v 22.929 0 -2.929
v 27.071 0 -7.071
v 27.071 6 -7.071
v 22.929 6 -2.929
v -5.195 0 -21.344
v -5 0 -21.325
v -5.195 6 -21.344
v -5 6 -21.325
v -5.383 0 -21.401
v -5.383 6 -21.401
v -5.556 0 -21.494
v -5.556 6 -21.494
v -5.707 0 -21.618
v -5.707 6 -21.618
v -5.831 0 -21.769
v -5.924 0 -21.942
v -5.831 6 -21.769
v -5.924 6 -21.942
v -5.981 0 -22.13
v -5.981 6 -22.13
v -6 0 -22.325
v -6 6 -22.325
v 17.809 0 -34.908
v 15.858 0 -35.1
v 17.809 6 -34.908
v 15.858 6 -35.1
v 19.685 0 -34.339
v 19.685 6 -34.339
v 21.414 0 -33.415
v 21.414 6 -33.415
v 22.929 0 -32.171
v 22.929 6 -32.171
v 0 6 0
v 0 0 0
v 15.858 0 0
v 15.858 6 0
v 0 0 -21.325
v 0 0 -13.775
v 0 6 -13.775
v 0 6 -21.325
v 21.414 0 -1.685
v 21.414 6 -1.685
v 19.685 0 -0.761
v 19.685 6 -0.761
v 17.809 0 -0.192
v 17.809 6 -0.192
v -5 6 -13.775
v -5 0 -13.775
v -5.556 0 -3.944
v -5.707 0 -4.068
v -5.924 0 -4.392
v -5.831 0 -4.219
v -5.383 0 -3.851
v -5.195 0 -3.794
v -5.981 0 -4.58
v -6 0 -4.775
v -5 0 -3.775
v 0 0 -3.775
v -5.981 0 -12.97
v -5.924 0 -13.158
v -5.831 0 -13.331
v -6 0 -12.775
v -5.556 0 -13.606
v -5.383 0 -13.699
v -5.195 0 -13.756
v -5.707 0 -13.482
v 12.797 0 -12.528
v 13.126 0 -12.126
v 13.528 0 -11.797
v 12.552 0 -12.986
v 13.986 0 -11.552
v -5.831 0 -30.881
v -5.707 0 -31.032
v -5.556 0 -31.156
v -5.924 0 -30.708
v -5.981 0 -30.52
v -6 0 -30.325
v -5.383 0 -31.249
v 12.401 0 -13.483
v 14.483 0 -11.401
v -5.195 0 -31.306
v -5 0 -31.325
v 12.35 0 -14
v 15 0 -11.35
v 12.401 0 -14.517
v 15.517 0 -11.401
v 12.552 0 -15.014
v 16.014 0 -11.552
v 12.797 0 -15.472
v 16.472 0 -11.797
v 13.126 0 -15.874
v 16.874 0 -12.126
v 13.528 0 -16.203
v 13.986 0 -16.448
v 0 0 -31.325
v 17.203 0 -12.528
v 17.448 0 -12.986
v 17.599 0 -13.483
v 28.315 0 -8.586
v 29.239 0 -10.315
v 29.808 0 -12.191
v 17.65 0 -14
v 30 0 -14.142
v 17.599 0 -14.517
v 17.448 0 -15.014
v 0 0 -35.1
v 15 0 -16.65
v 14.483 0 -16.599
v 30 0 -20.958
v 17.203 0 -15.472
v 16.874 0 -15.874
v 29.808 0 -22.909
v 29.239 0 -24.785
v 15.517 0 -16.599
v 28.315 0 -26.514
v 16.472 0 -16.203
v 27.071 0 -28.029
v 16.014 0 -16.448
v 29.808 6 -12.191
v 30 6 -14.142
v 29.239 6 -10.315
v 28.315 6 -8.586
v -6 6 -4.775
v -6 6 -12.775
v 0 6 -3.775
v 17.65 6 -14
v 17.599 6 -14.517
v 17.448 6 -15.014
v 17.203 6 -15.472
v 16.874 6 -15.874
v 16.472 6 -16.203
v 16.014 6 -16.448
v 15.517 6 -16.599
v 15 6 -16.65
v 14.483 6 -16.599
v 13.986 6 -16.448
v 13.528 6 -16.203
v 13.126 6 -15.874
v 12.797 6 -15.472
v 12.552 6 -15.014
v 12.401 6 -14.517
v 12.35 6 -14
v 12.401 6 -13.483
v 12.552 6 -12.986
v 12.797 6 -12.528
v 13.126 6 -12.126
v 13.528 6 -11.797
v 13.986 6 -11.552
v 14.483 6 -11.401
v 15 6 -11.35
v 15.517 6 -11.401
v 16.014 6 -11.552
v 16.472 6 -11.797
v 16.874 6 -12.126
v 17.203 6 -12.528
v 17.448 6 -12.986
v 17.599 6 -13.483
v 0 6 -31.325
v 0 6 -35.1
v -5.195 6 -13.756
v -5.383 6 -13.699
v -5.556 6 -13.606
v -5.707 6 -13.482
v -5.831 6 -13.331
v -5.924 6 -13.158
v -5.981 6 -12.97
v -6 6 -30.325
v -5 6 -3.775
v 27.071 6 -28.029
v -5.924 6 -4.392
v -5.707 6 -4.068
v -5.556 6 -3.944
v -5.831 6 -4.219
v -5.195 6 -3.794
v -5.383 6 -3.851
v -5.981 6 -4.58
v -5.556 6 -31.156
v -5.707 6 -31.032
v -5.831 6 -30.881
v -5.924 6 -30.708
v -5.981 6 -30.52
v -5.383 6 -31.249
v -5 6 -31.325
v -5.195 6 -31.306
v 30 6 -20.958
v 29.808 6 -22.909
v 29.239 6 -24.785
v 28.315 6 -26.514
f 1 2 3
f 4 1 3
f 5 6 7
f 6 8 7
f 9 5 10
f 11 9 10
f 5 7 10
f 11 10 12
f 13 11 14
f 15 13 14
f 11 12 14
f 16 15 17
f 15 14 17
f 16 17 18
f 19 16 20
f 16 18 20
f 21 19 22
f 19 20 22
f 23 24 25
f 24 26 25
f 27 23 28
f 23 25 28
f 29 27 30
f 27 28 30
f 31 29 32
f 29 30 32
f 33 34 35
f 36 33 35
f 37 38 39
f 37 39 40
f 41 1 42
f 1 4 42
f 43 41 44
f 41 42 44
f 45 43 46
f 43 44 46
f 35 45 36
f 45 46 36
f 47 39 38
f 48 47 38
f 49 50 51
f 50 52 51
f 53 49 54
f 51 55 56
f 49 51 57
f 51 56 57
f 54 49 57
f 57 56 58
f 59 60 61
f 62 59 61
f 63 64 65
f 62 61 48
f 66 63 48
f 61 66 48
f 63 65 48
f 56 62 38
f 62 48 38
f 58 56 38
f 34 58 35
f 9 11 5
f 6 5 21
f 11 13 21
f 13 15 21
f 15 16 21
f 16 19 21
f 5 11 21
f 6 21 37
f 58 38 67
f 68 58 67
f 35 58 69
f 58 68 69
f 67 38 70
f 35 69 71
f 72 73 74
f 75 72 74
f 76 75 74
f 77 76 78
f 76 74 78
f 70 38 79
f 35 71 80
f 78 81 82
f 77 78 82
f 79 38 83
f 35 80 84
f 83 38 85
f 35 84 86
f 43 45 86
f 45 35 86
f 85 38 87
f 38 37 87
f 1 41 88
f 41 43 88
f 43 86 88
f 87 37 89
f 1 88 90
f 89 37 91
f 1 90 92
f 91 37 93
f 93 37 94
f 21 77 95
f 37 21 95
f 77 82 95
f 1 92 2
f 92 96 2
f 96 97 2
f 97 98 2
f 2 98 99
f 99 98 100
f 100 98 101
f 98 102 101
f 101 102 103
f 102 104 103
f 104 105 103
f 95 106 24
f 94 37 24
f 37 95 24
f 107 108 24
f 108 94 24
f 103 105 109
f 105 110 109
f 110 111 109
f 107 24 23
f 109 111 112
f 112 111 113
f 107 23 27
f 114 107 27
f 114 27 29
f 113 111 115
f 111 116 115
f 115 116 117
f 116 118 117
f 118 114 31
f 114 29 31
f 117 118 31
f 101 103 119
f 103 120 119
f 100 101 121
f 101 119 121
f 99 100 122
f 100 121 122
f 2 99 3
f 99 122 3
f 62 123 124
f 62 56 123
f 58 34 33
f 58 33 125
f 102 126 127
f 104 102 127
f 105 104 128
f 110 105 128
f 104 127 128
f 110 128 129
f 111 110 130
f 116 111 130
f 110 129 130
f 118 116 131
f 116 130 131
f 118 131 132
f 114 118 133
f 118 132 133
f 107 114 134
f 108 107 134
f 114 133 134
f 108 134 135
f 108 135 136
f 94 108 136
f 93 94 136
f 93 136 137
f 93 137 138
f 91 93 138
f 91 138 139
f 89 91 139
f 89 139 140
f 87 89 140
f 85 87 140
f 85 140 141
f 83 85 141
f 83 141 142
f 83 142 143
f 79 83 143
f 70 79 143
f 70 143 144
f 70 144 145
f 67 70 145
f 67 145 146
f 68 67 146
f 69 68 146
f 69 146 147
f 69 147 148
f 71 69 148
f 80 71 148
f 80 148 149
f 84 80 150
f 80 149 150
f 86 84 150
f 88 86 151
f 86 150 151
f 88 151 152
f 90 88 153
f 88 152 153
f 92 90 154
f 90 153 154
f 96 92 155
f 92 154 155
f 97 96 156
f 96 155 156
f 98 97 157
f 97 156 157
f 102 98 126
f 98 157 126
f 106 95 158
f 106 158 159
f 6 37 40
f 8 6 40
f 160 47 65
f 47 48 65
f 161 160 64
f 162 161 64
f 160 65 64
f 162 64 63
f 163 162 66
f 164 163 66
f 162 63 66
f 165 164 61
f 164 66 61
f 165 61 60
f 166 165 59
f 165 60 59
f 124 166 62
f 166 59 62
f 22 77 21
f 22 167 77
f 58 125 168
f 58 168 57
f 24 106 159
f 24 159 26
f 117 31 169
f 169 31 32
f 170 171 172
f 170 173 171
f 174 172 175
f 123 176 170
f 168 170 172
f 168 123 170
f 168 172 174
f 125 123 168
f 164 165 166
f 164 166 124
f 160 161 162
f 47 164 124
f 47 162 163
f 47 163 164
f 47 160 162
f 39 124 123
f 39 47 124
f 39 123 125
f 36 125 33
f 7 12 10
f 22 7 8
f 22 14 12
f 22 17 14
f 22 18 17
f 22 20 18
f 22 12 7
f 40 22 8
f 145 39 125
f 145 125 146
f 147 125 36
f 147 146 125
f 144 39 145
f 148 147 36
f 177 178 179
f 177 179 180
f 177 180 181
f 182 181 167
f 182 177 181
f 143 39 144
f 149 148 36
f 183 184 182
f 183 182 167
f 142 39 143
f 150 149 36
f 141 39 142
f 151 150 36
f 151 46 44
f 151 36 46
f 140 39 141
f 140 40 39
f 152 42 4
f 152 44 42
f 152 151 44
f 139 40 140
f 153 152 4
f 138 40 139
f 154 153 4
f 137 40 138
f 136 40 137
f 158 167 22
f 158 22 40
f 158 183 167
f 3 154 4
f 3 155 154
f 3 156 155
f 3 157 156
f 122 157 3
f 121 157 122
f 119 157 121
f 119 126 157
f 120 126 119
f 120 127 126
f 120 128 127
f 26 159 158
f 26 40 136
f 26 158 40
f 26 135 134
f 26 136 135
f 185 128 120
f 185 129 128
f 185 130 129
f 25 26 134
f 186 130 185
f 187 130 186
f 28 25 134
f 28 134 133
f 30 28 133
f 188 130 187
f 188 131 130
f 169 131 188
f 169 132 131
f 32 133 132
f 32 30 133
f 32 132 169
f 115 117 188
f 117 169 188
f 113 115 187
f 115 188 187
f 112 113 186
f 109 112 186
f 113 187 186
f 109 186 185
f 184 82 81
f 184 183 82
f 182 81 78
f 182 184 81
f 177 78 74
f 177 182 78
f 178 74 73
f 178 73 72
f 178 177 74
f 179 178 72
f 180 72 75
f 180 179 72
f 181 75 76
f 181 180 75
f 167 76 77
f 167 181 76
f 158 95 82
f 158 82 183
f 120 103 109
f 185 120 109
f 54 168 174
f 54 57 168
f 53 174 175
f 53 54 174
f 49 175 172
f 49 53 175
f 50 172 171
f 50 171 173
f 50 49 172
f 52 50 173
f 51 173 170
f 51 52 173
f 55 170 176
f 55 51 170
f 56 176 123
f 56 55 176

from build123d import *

# Parameters (mm, degrees)
SKETCH1_W              = 30
SKETCH1_H              = 35.1
BOSS_EXTRUDE1_DEPTH    = 6
CHAMFER1_SIZE          = 10
M5_CLEARANCE_HOLE1_D   = 5.3
SKETCH234_W            = 10
SKETCH234_H            = 6
BOSS_EXTRUDE234_DEPTH  = 6
FILLET134_R            = 1
SKETCH2341_W           = 10
SKETCH2341_H           = 6
BOSS_EXTRUDE2341_DEPTH = 6
FILLET1341_R           = 1
FILLET1342_R           = 10


with BuildPart() as part:
    # Sketch1 → Boss-Extrude1 (new body)
    with BuildSketch(Plane(origin=(0, 0, 0), x_dir=(1, 0, 0), z_dir=(0, 1, 0))):
        with Locations((15, 17.55)):
            Rectangle(SKETCH1_W, SKETCH1_H)
    extrude(amount=BOSS_EXTRUDE1_DEPTH)

    # Chamfer1
    chamfer1_edges = [part.edges().sort_by_distance(p)[0] for p in [
        (30, 3, -35.1),
        (30, 3, 0),
    ]]
    chamfer(chamfer1_edges, length=CHAMFER1_SIZE)

    # M5 Clearance Hole1 (through all)
    with Locations(Plane(origin=(0, 0, 0), x_dir=(-1, 0, 0), z_dir=(0, -1, 0))):
        with Locations((-15, 14)):
            Hole(M5_CLEARANCE_HOLE1_D / 2)

    # Sketch234 → Boss-Extrude234 (add)
    with BuildSketch(Plane(origin=(0, 6, -8.007221392), x_dir=(0, 0, -1), z_dir=(-1, 0, 0))):
        with Locations((0.767778608, 3)):
            Rectangle(SKETCH234_W, SKETCH234_H)
    extrude(amount=BOSS_EXTRUDE234_DEPTH)

    # Fillet134
    fillet134_edges = [part.edges().sort_by_distance(p)[0] for p in [
        (-6, 3, -3.775),
        (-6, 3, -13.775),
    ]]
    fillet(fillet134_edges, radius=FILLET134_R)

    # Sketch2341 → Boss-Extrude2341 (add)
    with BuildSketch(Plane(origin=(0, 0, -27.092778608), x_dir=(0, 0, 1), z_dir=(-1, 0, 0))):
        with Locations((0.767778608, 3)):
            Rectangle(SKETCH2341_W, SKETCH2341_H)
    extrude(amount=BOSS_EXTRUDE2341_DEPTH)

    # Fillet1341
    fillet1341_edges = [part.edges().sort_by_distance(p)[0] for p in [
        (-6, 3, -21.325),
        (-6, 3, -31.325),
    ]]
    fillet(fillet1341_edges, radius=FILLET1341_R)

    # Fillet1342
    fillet1342_edges = [part.edges().sort_by_distance(p)[0] for p in [
        (20, 3, -35.1),
        (30, 3, -10),
        (30, 3, -25.1),
        (20, 3, 0),
    ]]
    fillet(fillet1342_edges, radius=FILLET1342_R)


solid = part.part
